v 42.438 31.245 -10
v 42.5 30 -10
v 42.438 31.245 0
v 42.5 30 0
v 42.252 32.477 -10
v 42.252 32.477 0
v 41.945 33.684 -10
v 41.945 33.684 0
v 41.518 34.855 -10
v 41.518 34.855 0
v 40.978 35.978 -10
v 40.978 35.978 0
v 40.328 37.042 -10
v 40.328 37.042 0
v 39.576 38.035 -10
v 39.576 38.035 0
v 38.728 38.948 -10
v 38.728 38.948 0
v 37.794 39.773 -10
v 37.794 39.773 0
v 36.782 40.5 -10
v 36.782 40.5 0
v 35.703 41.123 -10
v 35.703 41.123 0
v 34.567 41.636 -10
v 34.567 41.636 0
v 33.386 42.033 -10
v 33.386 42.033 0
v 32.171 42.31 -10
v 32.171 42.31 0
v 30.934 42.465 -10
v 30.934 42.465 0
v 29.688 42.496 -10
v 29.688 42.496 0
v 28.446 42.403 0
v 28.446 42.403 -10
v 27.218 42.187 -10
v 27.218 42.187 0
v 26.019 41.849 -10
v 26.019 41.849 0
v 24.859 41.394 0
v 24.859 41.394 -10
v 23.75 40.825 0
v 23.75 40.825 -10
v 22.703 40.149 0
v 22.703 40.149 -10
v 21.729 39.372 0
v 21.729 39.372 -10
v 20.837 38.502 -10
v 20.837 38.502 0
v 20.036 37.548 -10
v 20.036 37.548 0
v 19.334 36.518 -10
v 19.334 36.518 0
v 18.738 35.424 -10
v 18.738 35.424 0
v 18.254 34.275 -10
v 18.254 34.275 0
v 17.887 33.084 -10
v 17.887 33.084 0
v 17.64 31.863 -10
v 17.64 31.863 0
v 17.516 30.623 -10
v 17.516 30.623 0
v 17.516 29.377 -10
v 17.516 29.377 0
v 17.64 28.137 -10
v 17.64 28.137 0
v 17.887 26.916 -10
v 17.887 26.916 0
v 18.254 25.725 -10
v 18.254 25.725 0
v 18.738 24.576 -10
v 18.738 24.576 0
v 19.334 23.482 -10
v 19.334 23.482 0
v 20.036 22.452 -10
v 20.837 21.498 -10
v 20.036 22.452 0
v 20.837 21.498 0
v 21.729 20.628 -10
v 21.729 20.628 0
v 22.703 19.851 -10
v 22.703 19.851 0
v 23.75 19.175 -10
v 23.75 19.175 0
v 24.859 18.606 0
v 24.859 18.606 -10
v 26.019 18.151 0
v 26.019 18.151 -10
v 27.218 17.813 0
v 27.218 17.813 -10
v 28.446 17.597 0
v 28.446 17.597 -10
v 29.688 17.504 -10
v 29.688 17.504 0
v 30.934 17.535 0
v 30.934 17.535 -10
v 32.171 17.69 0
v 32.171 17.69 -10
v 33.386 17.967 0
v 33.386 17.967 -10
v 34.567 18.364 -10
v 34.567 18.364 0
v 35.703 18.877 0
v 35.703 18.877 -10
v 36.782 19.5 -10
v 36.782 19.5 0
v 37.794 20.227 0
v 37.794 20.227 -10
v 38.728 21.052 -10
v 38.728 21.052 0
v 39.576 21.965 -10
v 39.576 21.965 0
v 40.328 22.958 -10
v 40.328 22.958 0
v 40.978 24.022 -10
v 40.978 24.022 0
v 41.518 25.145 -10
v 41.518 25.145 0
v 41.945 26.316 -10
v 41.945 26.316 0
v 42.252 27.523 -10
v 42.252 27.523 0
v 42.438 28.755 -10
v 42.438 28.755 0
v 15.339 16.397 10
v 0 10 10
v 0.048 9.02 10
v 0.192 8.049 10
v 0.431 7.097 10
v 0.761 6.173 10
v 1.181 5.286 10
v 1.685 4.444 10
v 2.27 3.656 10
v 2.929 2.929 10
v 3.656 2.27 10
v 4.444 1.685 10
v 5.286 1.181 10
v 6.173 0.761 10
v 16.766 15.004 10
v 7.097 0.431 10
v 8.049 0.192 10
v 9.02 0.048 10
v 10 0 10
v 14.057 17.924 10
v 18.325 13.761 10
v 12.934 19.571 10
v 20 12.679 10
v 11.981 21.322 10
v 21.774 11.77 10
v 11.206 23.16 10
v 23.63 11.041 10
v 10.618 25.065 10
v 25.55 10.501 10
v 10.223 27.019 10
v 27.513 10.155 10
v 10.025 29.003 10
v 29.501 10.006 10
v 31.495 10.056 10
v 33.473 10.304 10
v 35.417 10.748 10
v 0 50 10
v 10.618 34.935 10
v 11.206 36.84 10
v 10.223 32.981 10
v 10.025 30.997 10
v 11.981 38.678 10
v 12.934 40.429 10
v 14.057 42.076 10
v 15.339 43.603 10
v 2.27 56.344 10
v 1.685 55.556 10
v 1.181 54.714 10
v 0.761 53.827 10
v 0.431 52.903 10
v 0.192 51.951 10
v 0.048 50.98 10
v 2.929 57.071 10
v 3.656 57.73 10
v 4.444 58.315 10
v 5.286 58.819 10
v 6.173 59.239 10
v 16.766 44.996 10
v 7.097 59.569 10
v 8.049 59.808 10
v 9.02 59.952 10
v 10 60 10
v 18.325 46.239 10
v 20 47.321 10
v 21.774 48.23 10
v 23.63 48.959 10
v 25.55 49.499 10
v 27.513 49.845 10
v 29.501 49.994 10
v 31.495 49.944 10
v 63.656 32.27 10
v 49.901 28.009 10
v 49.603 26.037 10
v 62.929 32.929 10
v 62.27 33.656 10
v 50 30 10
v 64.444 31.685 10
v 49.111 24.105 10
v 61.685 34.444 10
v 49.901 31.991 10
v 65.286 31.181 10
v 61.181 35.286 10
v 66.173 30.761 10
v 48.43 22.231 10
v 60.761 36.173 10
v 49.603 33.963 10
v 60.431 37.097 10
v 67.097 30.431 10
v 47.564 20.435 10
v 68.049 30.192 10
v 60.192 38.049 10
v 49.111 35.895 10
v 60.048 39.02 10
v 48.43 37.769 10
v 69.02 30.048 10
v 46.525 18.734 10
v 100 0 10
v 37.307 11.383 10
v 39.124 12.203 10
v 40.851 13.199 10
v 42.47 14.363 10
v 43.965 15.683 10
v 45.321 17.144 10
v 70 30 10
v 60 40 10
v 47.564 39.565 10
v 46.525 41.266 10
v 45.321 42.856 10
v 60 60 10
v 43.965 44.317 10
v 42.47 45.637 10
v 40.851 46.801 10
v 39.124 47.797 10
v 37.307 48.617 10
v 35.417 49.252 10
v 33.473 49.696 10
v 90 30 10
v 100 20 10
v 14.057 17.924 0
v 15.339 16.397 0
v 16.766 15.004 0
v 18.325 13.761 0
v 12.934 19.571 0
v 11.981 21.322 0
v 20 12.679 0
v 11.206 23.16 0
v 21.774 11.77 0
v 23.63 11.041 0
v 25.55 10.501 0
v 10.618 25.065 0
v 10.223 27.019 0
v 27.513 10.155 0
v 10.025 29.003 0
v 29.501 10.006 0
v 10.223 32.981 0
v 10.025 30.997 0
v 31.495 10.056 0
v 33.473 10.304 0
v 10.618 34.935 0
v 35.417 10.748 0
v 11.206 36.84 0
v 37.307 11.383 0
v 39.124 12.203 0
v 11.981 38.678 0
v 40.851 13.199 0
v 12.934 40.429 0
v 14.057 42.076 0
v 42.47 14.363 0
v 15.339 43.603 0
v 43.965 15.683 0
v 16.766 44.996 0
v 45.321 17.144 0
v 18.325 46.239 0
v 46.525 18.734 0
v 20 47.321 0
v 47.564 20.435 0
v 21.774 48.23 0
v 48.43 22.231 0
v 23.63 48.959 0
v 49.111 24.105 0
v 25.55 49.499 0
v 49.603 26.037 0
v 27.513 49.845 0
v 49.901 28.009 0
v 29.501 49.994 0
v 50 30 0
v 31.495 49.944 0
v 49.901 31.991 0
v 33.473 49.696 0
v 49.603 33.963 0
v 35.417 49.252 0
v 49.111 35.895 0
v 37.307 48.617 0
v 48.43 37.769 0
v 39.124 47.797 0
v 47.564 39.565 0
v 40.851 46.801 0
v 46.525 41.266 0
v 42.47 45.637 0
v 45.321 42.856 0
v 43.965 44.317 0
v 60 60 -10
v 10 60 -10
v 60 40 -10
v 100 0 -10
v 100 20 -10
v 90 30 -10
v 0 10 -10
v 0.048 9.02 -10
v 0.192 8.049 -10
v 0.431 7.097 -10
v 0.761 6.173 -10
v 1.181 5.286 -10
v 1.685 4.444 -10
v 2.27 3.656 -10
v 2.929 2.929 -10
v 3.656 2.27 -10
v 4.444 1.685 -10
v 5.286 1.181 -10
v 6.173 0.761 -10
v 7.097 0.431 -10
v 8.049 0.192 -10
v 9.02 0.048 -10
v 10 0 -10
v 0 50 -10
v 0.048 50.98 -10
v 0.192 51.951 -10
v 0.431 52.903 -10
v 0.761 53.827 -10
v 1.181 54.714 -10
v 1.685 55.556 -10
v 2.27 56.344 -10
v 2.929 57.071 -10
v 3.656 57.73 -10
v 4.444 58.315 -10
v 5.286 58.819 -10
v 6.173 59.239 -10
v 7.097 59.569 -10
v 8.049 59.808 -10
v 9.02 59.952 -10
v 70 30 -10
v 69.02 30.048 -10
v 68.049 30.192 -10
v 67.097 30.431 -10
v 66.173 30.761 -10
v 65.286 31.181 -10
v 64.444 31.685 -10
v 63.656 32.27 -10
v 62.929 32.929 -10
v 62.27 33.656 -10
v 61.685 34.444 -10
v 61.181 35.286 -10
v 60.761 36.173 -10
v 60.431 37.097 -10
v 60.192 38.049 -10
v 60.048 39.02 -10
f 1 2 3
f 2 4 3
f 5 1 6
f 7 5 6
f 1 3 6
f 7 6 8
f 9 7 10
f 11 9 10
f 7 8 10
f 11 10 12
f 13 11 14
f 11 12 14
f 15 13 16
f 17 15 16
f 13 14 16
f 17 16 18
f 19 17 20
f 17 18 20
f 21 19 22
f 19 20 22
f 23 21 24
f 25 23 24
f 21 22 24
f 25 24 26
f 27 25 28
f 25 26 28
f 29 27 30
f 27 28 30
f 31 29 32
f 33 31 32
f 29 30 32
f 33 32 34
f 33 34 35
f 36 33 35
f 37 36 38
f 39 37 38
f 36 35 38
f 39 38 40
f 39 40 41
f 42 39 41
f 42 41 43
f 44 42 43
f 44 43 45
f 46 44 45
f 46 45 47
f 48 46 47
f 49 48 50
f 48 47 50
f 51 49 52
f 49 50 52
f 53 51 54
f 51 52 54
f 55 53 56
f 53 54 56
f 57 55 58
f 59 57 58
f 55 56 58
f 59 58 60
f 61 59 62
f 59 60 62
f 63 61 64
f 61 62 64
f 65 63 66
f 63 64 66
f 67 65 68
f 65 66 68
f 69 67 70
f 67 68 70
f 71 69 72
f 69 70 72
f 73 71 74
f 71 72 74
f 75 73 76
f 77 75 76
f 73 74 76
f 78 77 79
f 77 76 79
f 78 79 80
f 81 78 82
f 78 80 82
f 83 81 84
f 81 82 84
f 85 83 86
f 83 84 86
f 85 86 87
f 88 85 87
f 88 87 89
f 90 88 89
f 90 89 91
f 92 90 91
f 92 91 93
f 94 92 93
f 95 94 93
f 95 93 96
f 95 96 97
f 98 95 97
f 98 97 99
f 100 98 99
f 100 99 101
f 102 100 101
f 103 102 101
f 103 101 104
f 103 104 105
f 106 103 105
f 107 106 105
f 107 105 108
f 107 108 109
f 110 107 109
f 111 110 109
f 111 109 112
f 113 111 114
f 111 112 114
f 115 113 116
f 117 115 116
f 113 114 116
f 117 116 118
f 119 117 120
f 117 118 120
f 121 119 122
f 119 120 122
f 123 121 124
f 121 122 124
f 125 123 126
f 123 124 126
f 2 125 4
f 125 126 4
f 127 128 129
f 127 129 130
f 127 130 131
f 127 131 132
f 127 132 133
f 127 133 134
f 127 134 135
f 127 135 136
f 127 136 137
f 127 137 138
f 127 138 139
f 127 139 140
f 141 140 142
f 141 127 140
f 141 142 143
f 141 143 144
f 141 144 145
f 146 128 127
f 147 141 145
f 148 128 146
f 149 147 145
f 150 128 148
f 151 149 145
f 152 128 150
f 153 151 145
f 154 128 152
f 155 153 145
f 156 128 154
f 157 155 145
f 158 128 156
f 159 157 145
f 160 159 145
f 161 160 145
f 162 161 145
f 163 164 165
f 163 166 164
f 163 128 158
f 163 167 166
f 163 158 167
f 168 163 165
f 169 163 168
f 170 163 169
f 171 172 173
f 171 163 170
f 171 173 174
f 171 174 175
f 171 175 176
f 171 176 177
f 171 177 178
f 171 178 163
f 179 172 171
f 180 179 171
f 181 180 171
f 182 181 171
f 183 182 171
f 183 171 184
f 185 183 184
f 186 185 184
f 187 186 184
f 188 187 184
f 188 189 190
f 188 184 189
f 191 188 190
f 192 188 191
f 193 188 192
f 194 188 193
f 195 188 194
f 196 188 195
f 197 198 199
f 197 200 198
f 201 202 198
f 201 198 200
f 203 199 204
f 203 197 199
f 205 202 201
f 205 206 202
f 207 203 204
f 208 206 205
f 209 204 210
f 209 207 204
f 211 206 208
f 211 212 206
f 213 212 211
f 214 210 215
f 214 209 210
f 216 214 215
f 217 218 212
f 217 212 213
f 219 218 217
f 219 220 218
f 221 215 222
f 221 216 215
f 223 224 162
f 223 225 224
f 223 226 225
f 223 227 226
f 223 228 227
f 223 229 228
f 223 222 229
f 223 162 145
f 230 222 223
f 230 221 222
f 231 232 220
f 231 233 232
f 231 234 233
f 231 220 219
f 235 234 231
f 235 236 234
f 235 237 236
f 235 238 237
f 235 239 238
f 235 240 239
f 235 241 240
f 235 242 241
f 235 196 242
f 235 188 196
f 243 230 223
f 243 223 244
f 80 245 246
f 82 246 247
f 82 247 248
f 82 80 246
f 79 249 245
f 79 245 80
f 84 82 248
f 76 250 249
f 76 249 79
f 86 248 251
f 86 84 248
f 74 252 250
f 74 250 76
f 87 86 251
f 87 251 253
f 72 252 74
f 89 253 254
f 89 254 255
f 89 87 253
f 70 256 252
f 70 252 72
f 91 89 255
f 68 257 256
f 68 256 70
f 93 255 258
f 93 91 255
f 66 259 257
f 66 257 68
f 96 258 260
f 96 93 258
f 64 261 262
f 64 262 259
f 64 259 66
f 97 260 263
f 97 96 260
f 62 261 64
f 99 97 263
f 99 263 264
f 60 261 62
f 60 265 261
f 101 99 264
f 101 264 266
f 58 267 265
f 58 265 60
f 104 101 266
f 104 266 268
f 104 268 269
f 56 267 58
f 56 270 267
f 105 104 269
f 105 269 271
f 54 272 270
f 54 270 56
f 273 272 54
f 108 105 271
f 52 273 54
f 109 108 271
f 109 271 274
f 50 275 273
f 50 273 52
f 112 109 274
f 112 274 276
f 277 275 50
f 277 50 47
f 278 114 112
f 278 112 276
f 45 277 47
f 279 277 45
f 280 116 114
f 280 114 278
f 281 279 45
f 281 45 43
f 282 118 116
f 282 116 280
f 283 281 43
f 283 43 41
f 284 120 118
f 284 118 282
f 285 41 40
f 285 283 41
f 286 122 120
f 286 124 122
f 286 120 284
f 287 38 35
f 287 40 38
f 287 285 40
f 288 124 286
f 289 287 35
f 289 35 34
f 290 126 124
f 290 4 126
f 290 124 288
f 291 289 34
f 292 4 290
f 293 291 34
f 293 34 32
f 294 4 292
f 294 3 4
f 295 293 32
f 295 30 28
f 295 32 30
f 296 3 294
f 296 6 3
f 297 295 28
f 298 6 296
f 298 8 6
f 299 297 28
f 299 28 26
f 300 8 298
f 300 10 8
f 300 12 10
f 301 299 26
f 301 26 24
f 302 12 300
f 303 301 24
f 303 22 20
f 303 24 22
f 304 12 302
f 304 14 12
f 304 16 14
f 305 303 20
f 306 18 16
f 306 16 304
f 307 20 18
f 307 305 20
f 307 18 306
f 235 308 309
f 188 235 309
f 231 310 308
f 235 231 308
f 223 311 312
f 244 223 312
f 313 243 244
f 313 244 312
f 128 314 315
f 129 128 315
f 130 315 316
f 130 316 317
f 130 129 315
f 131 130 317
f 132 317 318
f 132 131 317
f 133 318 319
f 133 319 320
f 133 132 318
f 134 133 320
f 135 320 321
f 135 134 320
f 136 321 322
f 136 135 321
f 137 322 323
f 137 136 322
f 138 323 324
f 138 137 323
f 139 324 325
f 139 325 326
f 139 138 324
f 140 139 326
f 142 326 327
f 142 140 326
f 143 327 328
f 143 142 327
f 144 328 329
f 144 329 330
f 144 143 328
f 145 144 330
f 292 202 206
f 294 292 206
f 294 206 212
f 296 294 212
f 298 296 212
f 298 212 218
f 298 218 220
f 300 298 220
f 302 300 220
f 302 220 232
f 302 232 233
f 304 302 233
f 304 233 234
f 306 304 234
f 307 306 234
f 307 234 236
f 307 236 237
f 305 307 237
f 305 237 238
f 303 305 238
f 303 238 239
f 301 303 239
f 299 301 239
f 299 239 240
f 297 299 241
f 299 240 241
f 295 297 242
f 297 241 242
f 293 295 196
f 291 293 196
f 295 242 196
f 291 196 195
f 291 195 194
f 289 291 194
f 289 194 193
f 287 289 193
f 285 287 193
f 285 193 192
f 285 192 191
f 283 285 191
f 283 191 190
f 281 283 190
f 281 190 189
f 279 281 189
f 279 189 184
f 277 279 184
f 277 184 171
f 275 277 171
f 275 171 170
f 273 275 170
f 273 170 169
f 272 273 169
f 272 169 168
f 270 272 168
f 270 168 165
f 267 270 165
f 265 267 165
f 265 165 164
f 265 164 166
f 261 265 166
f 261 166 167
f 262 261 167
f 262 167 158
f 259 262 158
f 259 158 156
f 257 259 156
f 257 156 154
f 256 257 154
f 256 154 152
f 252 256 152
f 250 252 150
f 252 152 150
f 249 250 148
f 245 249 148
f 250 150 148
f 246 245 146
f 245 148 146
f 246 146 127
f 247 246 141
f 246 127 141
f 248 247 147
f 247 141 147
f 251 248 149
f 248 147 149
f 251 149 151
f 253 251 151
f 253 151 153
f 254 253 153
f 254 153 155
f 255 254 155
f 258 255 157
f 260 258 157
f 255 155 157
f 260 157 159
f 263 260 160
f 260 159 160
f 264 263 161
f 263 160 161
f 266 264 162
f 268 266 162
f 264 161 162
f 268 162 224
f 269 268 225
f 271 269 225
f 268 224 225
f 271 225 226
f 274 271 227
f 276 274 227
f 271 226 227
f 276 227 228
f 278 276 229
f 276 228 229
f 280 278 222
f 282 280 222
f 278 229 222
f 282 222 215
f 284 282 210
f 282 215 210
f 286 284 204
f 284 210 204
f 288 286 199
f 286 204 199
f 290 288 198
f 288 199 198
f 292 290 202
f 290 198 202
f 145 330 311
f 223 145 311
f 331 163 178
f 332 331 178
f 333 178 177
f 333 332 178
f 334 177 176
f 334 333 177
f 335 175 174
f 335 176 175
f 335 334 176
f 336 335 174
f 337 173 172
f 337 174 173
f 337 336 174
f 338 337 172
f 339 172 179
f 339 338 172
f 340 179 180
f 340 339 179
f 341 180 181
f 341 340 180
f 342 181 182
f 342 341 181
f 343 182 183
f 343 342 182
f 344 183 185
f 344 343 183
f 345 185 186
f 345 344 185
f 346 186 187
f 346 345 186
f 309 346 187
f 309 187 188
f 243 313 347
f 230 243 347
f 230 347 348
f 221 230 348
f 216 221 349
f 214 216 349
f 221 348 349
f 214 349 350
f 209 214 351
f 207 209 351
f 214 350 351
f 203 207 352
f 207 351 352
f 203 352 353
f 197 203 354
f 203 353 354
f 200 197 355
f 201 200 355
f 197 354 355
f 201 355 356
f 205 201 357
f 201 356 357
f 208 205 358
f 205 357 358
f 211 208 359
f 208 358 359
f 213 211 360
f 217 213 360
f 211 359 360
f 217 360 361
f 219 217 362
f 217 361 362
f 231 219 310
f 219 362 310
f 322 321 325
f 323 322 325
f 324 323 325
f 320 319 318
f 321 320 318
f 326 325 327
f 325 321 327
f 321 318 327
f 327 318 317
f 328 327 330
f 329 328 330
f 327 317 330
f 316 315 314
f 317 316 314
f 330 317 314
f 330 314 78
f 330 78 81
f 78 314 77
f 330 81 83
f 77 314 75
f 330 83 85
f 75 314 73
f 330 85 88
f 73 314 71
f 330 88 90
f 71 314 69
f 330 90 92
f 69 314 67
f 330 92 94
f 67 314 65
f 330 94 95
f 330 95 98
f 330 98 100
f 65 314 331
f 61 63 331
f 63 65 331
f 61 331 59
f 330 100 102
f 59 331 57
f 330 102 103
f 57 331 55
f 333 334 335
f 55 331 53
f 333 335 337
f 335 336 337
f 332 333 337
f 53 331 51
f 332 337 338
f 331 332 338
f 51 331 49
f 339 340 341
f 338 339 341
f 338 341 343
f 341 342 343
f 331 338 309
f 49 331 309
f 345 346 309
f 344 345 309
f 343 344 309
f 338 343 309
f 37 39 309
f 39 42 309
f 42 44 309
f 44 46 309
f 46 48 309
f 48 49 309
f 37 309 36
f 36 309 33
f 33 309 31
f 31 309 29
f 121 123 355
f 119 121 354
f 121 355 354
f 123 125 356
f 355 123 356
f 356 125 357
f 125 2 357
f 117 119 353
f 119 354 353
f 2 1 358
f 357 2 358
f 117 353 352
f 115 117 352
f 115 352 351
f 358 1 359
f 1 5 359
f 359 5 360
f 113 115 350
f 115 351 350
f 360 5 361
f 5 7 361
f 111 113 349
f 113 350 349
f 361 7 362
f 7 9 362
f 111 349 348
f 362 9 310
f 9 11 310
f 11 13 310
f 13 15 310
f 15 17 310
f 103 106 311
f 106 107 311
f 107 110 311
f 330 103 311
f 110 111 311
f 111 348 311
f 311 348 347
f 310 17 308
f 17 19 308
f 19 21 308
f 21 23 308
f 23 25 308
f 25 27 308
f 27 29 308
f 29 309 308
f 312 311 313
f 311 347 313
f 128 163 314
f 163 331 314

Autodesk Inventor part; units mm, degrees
ref_plane "YZ Plane" through (0, 0, 0) normal (1, 0, 0) x (0, 1, 0)
ref_plane "XZ Plane" through (0, 0, 0) normal (0, 1, 0) x (-1, 0, 0)
ref_plane "XY Plane" through (0, 0, 0) normal (0, 0, 1) x (1, 0, 0)
sketch "Sketch1" plane through (0, 0, 0) normal (0, 0, 1) x (1, 0, 0)
  line L0 (0, 0) -> (100, 0)
  line L1 (100, 0) -> (100, 30)
  line L2 (100, 30) -> (60, 30)
  line L3 (60, 30) -> (60, 60)
  line L4 (60, 60) -> (0, 60)
  line L5 (0, 60) -> (0, 0)
  dimension "d14" = 100
  dimension "d15" = 30
  dimension "d16" = 60
  dimension "d19" = 60
extrude "Extrusion1" add sketch "Sketch1" along normal mid plane 20
chamfer "Chamfer1" distance 10 angle 45 1 edges at (100, 30, 0)
fillet "Fillet1" radius 10 1 edges at (60, 30, 0)
fillet "Fillet3" radius 10 1 edges at (0, 60, 0)
fillet "Fillet4" radius 10 1 edges at (0, 0, 0)
sketch "Sketch2" plane through (0, 0, 10) normal (0, 0, 1) x (1, 0, 0)
  circle A0 centre (30, 30) radius 20
  line L0 (10, 0) -> (100, 0) projected
  line L1 (0, 50) -> (0, 10) projected
  point P0 (0, 0)
  point P1 (90, 0)
  dimension "d18" = 30
  dimension "d20" = 30
  dimension "d21" = 40
sketch "Sketch3" plane through (0, 0, 10) normal (0, 0, 1) x (1, 0, 0)
  circle A0 centre (30, 30) radius 12.5
  line L0 (0, 50) -> (0, 10) projected
  line L1 (10, 0) -> (100, 0) projected
  point P0 (0, 0)
  point P1 (90, 0)
  dimension "d22" = 30
  dimension "d23" = 30
  dimension "d24" = 25
extrude "Extrusion2" cut sketch "Sketch2" against normal blind 10
extrude "Extrusion3" cut sketch "Sketch3" against normal blind 20
